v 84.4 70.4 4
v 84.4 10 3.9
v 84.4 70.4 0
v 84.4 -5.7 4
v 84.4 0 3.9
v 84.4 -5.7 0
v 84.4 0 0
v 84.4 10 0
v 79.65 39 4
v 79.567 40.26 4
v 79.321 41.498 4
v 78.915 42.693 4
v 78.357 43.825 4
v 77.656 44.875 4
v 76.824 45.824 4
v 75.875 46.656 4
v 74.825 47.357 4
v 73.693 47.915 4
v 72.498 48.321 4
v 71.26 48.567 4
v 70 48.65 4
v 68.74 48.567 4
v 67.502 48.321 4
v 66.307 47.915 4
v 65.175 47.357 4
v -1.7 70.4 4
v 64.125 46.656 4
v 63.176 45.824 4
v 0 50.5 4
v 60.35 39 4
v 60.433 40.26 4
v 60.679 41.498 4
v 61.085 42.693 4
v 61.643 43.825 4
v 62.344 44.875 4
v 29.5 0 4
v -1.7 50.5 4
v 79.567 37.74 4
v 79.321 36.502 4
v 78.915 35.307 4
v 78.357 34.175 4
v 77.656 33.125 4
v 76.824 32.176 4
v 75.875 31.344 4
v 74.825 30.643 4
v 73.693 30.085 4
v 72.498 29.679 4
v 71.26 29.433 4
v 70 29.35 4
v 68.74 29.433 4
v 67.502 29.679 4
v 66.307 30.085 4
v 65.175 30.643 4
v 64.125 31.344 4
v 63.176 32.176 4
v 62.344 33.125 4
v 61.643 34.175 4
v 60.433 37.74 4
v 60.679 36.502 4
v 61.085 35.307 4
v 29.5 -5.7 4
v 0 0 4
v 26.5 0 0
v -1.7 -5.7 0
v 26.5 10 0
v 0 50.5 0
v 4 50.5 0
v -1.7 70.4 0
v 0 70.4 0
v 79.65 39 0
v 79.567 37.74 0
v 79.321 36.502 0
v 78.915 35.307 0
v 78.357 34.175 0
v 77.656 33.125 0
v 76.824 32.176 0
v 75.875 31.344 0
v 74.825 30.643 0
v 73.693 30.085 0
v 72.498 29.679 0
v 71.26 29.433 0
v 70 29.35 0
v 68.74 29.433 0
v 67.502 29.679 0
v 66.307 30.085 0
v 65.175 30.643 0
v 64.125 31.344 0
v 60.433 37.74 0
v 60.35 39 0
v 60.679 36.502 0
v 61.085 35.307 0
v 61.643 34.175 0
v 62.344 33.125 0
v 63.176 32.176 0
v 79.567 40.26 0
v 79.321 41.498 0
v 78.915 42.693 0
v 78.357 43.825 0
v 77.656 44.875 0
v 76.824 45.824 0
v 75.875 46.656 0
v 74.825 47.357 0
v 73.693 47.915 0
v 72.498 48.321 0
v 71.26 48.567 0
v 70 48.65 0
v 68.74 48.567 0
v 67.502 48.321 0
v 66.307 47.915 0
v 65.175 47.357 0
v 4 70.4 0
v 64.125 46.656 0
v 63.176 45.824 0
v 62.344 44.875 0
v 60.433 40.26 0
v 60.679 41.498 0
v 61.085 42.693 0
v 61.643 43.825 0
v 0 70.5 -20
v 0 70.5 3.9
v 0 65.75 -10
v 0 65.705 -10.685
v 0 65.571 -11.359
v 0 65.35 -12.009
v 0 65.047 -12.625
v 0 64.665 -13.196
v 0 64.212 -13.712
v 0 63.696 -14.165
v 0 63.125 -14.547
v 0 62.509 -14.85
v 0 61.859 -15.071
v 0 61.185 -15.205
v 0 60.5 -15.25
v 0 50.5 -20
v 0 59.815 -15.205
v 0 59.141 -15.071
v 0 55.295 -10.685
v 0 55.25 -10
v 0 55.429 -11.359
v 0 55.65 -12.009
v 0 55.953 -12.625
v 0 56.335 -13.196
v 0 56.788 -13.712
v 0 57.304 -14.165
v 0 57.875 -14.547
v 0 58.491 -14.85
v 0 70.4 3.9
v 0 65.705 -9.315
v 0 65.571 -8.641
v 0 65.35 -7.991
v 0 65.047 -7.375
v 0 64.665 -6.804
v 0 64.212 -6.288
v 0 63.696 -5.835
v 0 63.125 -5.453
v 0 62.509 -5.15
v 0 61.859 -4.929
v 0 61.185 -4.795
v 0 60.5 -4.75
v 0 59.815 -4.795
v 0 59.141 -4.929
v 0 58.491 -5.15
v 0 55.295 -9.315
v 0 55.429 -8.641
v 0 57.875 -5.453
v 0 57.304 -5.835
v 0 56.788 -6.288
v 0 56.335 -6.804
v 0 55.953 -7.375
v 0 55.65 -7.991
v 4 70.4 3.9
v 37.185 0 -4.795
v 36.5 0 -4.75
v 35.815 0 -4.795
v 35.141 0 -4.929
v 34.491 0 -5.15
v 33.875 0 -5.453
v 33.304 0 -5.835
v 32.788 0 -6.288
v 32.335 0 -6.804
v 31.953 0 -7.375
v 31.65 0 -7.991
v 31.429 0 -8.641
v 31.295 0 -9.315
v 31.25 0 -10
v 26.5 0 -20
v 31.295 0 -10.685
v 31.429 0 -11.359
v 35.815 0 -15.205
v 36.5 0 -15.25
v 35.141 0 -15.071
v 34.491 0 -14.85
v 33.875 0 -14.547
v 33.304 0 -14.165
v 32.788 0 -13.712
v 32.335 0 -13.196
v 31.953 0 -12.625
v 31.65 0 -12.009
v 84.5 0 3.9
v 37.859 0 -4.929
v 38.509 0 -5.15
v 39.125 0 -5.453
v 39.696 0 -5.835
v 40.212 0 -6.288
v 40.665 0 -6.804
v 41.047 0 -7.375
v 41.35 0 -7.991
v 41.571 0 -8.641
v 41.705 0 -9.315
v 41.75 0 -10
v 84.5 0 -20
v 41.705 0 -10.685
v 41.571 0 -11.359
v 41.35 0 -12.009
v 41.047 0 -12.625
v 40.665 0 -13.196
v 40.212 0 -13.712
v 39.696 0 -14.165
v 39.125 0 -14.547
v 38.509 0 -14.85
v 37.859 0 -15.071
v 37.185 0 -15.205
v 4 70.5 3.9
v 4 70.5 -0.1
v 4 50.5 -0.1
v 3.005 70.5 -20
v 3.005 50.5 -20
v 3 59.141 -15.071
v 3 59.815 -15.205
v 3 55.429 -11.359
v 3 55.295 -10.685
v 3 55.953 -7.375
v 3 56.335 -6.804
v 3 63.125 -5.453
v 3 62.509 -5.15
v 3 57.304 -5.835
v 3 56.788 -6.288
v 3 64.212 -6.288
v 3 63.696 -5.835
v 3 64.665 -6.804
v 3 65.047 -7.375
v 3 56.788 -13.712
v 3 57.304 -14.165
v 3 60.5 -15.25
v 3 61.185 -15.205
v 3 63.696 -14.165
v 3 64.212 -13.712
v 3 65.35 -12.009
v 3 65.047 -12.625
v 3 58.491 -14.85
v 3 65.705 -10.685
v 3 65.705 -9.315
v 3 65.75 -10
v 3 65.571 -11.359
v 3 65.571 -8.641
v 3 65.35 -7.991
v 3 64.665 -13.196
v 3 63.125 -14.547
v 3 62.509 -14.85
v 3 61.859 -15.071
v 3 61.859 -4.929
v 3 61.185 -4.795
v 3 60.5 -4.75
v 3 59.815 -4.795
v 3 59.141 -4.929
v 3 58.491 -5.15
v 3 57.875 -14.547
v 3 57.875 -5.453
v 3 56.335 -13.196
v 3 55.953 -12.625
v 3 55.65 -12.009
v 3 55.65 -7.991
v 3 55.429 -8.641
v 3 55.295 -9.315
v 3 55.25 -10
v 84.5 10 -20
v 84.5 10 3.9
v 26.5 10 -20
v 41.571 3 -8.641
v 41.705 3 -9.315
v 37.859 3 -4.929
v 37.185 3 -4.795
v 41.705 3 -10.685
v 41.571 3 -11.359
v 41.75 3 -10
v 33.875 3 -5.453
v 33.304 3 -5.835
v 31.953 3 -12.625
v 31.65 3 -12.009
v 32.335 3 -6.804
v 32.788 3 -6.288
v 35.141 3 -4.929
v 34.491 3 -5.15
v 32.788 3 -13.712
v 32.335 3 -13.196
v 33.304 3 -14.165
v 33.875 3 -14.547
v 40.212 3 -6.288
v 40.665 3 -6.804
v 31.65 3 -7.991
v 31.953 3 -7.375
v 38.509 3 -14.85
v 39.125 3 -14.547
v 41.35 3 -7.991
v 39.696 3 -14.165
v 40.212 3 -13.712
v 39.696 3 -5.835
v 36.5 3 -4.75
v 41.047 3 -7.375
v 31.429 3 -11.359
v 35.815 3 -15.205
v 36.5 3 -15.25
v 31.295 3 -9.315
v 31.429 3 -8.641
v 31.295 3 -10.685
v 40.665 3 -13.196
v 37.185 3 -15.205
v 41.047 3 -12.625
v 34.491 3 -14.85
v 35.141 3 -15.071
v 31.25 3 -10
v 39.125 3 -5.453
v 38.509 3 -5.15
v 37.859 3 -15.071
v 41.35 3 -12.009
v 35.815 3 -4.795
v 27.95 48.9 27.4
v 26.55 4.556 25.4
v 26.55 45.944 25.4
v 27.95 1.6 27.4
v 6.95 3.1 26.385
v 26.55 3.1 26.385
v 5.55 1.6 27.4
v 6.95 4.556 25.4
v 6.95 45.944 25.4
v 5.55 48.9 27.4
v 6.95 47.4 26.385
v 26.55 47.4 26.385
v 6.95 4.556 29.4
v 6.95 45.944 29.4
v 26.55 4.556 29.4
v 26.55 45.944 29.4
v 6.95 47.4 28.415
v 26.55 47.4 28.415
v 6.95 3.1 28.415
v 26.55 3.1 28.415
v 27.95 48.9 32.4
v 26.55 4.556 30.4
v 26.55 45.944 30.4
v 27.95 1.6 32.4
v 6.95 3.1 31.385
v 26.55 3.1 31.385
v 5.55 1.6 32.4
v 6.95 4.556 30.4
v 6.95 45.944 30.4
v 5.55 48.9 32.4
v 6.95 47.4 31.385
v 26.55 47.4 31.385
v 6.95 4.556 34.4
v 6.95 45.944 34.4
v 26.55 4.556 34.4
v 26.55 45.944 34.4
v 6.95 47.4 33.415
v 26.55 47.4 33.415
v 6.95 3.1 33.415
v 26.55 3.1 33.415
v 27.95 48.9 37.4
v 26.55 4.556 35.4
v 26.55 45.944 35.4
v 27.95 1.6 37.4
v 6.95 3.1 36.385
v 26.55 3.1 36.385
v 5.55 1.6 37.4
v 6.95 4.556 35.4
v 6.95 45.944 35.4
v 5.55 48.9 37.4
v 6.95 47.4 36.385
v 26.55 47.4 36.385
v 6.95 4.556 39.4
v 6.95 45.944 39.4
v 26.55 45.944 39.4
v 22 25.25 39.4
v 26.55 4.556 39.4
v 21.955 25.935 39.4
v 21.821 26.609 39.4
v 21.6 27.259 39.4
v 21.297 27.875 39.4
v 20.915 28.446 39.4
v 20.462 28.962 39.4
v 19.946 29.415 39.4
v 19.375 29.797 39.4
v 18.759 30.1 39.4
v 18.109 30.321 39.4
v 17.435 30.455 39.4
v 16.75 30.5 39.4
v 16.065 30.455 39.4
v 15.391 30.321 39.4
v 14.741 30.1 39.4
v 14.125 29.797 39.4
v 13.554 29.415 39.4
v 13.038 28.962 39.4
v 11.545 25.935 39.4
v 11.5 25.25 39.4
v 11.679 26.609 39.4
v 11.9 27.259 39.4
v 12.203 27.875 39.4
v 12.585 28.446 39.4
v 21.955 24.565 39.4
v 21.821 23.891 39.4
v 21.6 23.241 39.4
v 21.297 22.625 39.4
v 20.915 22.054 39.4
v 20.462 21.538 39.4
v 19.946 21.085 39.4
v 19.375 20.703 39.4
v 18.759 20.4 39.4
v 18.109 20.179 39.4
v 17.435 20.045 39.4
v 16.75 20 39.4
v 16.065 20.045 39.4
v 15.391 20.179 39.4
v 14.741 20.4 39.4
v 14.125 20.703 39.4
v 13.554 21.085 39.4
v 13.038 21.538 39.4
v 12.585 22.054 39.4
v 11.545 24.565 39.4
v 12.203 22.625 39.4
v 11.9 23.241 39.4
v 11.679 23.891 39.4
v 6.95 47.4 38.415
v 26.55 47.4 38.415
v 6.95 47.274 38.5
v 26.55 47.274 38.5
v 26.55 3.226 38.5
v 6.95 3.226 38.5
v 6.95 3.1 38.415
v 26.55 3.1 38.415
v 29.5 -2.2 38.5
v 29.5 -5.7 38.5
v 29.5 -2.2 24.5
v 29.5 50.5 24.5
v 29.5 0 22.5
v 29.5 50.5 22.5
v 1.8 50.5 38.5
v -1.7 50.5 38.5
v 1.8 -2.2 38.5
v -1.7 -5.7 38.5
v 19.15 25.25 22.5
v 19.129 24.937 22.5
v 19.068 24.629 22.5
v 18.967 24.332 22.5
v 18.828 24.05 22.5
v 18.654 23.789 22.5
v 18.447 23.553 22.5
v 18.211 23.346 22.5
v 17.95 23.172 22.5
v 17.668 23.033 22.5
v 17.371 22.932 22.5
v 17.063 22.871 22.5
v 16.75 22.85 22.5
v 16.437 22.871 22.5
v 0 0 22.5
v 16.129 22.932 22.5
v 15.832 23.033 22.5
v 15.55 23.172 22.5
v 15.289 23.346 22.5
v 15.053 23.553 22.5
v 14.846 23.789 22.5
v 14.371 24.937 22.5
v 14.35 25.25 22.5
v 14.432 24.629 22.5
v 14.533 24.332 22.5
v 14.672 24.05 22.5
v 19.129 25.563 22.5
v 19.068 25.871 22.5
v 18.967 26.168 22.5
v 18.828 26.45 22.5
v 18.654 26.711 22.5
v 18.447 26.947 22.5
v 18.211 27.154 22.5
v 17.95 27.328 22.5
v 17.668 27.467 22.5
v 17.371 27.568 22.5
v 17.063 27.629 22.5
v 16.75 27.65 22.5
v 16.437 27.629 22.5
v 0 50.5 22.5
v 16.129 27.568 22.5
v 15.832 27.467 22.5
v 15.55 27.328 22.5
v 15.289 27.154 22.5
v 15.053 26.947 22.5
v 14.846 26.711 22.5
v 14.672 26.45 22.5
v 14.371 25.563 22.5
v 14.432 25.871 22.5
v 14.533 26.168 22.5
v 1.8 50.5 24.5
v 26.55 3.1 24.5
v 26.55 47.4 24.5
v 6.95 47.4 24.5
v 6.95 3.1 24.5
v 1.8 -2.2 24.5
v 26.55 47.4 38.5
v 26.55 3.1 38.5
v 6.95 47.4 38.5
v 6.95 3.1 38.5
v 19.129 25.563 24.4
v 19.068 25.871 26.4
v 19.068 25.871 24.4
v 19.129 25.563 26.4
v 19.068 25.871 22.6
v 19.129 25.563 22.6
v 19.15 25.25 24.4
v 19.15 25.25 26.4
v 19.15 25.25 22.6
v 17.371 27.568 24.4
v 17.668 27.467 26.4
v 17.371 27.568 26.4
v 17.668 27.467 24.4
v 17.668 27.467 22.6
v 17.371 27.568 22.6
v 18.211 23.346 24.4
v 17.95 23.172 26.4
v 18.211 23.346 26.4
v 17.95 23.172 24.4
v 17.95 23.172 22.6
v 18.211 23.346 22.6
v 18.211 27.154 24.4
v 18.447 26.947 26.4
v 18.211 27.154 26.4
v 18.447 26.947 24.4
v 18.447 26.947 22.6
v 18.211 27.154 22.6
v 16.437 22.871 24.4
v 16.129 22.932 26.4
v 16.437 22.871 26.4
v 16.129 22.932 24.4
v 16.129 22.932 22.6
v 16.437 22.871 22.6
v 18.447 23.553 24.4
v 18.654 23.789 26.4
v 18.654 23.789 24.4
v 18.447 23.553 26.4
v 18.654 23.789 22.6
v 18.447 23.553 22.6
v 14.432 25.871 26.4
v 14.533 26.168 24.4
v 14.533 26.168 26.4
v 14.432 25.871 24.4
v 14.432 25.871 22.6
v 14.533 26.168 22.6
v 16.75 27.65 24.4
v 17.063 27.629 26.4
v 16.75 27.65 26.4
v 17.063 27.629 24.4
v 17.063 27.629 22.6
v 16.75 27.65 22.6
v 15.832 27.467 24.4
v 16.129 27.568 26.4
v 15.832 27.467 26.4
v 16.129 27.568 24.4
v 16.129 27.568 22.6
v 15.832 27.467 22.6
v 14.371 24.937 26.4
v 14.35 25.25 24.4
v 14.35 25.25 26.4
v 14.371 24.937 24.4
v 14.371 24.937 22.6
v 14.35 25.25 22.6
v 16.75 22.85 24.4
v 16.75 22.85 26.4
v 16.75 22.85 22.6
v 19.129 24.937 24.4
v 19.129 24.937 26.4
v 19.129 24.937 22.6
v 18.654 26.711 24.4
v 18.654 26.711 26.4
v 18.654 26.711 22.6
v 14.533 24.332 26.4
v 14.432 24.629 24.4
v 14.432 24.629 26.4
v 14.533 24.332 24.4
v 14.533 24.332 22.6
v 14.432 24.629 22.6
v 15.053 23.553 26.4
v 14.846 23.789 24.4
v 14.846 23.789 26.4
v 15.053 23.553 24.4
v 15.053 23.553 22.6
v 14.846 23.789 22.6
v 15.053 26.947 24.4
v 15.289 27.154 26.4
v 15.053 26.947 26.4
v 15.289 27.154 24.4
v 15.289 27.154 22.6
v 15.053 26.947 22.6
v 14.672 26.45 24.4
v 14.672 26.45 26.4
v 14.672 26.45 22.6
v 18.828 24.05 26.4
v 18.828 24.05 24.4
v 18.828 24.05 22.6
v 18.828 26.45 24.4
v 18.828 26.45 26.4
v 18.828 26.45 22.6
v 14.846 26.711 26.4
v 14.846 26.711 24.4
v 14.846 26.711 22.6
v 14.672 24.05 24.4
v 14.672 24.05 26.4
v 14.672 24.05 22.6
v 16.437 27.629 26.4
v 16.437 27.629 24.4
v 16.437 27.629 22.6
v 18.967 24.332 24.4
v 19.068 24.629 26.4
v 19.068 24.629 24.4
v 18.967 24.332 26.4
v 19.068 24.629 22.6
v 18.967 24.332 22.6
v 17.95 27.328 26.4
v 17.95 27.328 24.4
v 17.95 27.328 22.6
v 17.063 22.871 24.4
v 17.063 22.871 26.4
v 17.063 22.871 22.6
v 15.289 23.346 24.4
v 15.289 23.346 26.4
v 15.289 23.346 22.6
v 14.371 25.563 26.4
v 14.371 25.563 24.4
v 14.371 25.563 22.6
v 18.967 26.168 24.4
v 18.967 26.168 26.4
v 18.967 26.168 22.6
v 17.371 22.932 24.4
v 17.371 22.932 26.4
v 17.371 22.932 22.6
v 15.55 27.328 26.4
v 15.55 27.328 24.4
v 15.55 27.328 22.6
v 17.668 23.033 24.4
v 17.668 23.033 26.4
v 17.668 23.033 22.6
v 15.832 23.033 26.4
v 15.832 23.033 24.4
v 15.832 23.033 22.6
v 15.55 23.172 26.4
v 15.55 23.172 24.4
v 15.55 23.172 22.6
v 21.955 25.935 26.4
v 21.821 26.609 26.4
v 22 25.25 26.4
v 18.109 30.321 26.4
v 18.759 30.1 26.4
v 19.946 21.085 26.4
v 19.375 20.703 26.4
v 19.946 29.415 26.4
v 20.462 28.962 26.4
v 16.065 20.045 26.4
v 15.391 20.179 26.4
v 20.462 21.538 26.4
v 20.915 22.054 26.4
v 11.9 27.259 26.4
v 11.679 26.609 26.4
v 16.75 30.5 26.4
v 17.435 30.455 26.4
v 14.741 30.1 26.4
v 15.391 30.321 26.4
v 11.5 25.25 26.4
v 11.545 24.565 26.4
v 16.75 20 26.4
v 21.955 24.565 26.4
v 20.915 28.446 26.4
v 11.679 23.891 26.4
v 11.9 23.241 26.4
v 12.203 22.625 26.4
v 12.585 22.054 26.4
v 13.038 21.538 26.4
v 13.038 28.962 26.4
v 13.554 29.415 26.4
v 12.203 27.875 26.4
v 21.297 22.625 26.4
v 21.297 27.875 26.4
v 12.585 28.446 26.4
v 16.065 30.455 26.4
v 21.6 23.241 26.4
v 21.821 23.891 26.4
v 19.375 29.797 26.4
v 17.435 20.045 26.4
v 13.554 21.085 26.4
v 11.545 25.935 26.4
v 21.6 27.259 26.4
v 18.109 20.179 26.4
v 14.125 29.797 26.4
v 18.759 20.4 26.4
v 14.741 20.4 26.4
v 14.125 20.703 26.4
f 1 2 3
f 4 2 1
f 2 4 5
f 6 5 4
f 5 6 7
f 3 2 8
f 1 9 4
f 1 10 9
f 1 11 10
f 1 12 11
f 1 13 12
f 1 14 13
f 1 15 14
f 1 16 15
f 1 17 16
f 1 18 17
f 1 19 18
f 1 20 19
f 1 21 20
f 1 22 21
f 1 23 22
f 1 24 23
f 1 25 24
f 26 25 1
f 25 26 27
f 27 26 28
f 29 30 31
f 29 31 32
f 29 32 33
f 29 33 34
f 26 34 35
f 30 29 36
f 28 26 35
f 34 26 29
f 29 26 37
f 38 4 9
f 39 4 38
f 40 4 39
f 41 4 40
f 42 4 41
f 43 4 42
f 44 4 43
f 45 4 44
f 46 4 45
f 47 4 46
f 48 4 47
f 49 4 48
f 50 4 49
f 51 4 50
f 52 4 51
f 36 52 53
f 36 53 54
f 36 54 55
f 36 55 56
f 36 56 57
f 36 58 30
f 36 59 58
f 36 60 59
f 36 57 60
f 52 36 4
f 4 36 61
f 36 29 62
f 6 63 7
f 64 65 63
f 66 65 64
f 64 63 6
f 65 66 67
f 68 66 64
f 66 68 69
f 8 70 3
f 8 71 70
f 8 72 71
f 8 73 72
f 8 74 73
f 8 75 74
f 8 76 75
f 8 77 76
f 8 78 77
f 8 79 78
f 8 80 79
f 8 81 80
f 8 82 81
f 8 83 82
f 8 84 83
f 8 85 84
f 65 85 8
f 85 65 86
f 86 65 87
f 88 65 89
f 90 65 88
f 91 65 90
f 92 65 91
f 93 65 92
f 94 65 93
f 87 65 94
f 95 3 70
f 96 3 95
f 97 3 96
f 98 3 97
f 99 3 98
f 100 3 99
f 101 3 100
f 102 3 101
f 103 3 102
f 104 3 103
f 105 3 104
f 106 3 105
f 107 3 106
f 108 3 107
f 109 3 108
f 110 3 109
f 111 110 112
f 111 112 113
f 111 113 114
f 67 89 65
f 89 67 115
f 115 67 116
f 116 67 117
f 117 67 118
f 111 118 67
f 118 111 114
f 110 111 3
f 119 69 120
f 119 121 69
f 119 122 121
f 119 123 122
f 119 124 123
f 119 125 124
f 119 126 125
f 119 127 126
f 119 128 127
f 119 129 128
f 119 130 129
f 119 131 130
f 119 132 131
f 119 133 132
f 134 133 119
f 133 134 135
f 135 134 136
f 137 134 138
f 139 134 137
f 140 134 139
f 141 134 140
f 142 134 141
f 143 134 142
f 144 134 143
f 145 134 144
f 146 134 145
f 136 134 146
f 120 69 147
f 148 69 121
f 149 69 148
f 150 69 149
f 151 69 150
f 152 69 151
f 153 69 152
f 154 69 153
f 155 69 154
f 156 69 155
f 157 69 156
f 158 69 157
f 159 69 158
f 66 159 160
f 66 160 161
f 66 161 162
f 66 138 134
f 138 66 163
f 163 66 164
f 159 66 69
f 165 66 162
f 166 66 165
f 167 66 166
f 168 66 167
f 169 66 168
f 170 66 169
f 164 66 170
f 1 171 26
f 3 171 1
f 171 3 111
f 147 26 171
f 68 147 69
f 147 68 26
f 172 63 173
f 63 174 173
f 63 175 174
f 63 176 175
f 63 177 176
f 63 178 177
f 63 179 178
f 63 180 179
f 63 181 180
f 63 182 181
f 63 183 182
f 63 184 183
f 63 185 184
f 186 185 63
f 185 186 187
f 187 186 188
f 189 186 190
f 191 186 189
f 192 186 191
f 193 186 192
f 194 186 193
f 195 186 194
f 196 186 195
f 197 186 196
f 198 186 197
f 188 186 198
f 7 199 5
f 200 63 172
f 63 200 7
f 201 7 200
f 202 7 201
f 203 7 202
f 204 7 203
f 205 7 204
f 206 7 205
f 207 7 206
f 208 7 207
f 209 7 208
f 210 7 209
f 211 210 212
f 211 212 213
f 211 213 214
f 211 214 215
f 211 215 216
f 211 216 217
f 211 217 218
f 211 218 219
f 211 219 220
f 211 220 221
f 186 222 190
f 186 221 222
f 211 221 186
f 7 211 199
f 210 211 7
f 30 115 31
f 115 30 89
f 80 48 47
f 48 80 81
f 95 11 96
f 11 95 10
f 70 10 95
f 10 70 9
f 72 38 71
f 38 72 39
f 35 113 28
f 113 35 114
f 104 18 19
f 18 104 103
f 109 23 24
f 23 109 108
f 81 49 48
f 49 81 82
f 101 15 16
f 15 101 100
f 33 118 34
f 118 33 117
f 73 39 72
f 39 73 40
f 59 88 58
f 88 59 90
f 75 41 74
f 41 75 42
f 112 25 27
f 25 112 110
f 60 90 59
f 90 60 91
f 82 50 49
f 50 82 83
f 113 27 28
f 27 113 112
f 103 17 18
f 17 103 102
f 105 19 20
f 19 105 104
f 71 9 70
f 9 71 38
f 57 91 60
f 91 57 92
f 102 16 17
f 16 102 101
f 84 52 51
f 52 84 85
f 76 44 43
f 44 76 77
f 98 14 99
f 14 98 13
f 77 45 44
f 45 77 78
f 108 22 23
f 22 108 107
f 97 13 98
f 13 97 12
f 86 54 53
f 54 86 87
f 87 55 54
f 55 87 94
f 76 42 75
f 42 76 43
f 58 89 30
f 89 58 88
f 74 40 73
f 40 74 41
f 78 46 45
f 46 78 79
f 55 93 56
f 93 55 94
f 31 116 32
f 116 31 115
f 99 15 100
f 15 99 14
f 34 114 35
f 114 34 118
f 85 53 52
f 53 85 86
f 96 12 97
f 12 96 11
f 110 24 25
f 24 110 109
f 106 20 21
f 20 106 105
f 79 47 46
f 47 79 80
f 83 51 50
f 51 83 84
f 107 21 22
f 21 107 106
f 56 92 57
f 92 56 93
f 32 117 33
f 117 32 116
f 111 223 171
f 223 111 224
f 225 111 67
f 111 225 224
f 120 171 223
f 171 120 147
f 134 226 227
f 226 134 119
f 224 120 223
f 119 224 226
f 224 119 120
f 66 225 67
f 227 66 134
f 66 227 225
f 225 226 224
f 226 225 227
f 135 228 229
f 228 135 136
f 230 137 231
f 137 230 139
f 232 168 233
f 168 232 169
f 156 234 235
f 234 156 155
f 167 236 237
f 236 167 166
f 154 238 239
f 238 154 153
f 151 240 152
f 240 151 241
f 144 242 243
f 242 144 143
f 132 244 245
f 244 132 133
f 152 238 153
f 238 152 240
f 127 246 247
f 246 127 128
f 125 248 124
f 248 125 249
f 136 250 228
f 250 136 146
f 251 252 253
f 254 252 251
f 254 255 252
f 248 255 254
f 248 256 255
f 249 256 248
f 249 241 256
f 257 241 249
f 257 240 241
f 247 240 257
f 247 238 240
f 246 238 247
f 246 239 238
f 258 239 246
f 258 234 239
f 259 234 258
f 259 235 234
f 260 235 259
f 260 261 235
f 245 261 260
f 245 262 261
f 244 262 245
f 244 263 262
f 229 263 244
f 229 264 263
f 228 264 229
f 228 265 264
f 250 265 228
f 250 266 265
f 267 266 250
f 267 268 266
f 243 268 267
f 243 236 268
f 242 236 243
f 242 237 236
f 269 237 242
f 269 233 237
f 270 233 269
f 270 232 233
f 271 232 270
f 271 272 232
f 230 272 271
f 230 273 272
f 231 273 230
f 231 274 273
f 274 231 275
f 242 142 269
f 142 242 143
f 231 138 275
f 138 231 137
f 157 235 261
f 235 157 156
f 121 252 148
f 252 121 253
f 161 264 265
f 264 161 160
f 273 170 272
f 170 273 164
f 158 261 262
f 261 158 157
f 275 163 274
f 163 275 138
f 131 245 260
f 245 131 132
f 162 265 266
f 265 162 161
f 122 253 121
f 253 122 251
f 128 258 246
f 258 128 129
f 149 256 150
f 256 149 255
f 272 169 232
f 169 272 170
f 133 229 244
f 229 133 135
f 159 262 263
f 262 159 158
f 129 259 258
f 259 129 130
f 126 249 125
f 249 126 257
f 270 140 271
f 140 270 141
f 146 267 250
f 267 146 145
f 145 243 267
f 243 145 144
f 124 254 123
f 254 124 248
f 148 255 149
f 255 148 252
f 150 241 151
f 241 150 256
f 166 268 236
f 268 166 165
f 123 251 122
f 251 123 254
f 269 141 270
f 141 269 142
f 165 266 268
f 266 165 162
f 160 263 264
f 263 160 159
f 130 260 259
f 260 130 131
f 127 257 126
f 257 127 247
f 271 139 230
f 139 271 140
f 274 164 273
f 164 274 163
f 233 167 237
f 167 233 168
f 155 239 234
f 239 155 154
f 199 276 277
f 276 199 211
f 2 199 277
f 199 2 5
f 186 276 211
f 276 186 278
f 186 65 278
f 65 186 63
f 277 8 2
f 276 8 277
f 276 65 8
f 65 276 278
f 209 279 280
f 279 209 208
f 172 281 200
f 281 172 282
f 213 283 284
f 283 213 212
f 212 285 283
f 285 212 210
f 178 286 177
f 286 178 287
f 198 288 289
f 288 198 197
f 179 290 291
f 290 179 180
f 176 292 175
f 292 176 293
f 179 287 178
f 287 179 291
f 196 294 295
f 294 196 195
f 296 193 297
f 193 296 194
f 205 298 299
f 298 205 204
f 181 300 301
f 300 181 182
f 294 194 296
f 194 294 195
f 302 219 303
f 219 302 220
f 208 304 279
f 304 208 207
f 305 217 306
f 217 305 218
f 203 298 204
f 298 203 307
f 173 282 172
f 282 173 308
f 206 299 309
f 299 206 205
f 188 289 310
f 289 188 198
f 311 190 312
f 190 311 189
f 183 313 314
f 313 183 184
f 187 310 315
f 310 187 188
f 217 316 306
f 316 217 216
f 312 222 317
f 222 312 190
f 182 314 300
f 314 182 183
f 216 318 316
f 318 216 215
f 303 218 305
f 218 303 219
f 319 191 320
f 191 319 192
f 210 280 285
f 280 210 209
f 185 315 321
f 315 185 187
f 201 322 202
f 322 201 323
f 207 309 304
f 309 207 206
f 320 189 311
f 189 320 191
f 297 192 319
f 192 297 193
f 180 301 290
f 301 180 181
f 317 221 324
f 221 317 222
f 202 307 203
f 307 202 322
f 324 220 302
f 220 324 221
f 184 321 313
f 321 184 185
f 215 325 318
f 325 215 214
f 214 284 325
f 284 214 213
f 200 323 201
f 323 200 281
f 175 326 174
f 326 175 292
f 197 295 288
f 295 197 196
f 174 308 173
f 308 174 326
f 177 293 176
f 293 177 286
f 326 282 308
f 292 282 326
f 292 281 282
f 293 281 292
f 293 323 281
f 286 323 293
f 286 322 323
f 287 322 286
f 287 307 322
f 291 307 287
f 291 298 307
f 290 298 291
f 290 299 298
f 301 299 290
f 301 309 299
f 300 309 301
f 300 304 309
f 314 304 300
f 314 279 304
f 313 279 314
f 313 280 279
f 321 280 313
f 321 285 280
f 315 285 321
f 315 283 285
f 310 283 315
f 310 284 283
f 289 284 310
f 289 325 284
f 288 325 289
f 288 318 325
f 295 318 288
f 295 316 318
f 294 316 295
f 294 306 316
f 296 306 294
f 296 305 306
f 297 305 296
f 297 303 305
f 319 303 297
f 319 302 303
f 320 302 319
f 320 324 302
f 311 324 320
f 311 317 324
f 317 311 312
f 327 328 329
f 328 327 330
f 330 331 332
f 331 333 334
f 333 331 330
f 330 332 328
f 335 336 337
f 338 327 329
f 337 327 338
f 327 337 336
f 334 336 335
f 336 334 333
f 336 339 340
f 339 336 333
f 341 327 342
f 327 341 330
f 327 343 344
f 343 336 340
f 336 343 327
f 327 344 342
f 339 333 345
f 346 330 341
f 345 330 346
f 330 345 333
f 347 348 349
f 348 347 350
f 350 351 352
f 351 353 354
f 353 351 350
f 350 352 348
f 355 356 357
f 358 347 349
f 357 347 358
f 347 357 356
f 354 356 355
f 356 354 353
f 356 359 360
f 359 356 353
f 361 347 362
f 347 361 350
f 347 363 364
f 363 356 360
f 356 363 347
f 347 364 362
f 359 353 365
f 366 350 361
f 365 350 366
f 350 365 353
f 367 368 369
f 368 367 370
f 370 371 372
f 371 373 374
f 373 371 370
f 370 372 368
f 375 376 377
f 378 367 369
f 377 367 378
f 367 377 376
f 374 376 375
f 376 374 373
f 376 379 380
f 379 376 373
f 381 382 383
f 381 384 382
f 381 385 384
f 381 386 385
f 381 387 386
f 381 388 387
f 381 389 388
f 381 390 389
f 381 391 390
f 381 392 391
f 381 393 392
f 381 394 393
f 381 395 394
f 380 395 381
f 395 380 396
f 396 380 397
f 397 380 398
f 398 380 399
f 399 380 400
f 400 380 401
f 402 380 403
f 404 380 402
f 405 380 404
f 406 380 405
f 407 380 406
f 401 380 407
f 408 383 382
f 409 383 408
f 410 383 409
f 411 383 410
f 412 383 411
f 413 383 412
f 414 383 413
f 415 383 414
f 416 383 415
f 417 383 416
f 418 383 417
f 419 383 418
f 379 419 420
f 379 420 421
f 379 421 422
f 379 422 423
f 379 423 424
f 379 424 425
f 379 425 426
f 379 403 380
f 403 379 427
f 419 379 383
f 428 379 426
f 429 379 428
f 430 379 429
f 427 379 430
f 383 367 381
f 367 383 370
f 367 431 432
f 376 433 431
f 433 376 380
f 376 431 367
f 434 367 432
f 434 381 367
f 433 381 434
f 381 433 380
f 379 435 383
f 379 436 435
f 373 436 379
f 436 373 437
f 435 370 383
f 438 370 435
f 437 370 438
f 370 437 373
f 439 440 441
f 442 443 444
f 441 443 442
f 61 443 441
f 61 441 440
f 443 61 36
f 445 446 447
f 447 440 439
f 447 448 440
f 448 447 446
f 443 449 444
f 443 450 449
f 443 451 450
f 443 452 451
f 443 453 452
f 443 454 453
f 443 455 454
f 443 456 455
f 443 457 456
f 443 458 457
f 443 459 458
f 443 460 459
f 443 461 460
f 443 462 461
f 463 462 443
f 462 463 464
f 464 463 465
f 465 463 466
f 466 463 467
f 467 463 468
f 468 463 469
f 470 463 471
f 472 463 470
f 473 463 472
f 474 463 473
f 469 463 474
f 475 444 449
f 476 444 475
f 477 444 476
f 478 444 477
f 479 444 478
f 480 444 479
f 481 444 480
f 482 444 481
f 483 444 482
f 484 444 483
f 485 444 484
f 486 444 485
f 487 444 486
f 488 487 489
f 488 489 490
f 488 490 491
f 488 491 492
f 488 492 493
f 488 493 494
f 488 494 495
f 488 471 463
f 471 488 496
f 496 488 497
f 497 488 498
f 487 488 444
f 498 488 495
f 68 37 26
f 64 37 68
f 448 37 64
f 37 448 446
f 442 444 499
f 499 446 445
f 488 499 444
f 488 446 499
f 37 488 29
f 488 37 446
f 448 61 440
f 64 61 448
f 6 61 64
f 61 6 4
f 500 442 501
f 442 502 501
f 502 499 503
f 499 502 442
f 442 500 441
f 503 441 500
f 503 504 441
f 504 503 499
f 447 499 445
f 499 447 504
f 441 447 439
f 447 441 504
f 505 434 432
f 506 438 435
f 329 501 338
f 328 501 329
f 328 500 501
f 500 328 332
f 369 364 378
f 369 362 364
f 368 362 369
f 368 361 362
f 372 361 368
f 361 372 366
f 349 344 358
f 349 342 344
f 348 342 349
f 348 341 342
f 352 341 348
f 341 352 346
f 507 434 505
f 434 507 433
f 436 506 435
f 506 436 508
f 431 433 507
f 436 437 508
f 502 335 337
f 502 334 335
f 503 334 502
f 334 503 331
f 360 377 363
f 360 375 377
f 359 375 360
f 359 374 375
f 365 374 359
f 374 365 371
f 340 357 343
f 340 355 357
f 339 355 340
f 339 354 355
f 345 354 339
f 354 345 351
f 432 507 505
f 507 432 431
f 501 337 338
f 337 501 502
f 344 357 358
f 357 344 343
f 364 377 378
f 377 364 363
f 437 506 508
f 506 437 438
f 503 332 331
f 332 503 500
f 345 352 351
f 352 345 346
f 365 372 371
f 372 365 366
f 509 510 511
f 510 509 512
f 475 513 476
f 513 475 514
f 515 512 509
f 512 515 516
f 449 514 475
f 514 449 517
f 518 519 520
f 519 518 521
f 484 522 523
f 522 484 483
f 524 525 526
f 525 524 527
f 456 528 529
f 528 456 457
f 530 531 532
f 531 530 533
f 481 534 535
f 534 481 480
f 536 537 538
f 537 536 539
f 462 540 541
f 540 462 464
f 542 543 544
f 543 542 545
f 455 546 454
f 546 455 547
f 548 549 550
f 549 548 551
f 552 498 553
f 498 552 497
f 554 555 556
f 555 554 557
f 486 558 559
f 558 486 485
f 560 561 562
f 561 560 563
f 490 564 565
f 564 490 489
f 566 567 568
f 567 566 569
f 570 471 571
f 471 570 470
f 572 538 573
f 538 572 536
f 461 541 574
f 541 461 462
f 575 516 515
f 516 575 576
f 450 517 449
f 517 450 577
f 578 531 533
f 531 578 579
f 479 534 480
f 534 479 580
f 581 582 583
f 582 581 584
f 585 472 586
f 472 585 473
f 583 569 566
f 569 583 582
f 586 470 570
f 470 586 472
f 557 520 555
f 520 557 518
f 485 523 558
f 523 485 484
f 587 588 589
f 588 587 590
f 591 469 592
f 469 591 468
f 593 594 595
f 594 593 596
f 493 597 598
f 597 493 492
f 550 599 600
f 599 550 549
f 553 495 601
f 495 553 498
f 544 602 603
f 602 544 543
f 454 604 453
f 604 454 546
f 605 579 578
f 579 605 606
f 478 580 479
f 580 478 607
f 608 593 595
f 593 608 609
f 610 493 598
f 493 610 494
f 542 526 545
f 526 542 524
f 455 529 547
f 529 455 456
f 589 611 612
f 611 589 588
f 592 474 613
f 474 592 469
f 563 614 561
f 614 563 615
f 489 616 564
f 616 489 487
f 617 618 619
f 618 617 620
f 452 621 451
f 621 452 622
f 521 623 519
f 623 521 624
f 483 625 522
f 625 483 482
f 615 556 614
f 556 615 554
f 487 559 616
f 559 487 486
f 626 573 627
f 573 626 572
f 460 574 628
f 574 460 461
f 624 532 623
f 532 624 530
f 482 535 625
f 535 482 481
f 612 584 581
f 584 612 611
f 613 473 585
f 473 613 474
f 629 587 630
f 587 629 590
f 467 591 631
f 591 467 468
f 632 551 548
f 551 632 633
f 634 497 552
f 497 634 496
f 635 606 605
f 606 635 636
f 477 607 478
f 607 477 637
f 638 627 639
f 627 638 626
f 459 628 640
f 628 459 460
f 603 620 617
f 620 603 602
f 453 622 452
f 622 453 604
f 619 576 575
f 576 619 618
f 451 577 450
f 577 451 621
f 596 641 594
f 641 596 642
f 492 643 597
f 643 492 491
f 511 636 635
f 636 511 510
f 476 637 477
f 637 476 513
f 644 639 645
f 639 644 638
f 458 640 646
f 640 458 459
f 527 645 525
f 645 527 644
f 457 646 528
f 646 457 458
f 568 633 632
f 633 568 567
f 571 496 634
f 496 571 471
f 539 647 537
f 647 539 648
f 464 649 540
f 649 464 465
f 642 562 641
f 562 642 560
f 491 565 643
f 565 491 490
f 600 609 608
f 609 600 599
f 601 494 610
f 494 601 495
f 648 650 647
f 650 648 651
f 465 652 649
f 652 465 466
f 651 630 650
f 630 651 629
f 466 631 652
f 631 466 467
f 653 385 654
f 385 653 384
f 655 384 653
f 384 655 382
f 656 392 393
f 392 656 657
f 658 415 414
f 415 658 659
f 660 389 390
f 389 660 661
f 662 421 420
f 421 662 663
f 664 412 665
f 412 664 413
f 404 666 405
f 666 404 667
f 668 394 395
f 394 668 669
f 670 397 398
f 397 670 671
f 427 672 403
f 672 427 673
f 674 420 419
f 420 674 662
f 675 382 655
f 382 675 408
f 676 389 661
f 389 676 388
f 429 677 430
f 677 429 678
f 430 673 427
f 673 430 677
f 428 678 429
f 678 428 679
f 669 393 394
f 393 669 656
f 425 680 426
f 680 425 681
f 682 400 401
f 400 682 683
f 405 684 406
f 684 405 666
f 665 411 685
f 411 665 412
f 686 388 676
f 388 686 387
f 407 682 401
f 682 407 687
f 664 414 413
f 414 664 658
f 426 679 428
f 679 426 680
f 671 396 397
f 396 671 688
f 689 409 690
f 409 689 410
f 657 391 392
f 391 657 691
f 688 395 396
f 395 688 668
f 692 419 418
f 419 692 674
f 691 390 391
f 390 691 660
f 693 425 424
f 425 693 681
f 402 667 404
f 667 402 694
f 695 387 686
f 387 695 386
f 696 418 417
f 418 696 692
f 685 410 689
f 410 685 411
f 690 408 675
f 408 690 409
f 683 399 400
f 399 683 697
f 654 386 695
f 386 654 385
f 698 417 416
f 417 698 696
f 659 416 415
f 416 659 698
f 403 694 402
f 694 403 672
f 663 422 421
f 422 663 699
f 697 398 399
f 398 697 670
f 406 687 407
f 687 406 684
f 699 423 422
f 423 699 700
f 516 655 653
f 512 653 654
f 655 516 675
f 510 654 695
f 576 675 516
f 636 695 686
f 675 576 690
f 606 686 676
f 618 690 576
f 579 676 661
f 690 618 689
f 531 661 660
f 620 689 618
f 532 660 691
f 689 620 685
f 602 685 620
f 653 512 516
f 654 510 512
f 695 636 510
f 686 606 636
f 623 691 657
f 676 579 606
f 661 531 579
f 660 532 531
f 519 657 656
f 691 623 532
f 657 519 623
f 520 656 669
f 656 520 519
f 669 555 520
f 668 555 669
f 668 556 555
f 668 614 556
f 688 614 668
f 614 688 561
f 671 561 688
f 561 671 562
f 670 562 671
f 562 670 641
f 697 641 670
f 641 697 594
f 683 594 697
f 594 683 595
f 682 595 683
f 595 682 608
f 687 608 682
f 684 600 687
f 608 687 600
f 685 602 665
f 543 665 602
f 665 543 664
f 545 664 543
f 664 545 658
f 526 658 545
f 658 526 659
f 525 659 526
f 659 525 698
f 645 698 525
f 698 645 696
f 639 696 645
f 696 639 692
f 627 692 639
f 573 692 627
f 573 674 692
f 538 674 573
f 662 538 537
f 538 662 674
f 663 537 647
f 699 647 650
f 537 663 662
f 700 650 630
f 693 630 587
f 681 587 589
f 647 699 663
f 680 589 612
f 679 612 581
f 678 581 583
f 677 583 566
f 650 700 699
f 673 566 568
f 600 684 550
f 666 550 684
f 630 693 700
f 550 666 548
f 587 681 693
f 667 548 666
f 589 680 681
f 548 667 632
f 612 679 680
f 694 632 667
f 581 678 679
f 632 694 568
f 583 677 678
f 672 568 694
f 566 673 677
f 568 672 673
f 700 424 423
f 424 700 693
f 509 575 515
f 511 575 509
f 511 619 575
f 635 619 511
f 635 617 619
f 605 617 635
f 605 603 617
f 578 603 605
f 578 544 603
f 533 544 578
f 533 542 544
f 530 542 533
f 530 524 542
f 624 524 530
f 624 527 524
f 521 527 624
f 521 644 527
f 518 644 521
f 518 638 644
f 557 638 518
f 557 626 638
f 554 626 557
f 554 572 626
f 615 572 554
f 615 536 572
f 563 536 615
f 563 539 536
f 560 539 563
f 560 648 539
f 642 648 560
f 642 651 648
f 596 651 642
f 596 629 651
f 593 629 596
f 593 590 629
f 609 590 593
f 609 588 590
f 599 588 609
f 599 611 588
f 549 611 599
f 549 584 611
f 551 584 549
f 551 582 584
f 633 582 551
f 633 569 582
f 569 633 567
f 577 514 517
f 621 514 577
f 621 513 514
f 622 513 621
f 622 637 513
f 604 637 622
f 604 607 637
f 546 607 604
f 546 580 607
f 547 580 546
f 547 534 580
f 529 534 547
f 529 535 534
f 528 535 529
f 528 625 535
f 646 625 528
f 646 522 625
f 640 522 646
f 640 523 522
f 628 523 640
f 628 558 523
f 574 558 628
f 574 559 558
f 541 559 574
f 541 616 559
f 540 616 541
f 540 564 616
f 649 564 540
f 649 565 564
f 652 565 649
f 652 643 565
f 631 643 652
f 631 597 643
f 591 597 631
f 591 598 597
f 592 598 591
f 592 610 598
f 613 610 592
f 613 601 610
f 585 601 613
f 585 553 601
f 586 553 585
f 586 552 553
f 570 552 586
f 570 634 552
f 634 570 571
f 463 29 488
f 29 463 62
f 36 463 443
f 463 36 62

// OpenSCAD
/* 3d printer enclosure from Ikea Melltorp table. Connector pieces. */

/* [Global] */
part = "both"; // [above:Leg coupler (above table top),above-wrap:Leg coupler (wraps around table top),below:Magnet holder (below table top)]

/* [Hidden] */
function inch() = 25.4;
function inner_clear() = 0.5; // how much larger to make holes
$fn = 48;

function middle_thick() = 4; // a bit of clearance from ring_thick()
function magnet_diam() = 10;
function magnet_depth() = 3;
function magnet_margin() = 5;

function ring_inset() = [70,39];
function ring_extra() = [5,22];
function ring_diam() = 17.8 + 1/*clearance*/;
function ring_thick() = 6.1; /* measured */

function leg_inset() = [4,0]; // from 70.2 to 69.4
function table_thick() = 18.5; // 18.2 with a little bit of clearance
function plexi_thick() = 2.2; // including clearance (measured 1.8mm)
function above_thick() = 2; // thickness underneath leg holder
function plexi_guide_thick() = 3.5;


piece(which=part);

module piece(which="both") {
  if (which=="below" || which=="both") {
    below_bracket();
  }
  if (which=="above" || which=="above-wrap" || which=="both") {
    above_bracket();
  }
  if (which=="above-wrap" || which=="both") {
    above_wrapper(shrink=(which=="above-wrap"));
  }
}

module middle(wall=[0,0], extra=[0,0]) {
  inset = ring_inset();
  margin = ring_extra();
  difference() {
    translate([-wall.x,-wall.y,0])
    cube([inset.x + ring_diam()/2 + margin.x + wall.x - extra.x,
          inset.y + ring_diam()/2 + margin.y + wall.y - extra.y,
          middle_thick()]);
    translate([inset.x,inset.y,-1])
      cylinder(d=ring_diam() + inner_clear(), h=middle_thick() + 2);
  }
}

module below_bracket() {
  magnet_y = 14;
  height = magnet_y + magnet_diam()/2 + magnet_margin();
  width = magnet_diam() + 2*magnet_margin();
  extra_width = 38; /* for side holder x axis */
  epsilon=.1;
  middle();
  // front holder
  difference() {
    translate([0,50.5,middle_thick()-height])
      cube([4,width,height-epsilon]);
    translate([3,50.5-epsilon,middle_thick()-height-epsilon])
      rotate([0,atan2(1,height-middle_thick()),0]) // 1mm over height-middle_thick() mm
      cube([2,width+2*epsilon,height+epsilon]);
    translate([-epsilon, 50.5 + width/2, middle_thick() - magnet_y])
      rotate([0,90,0])
      cylinder(d=magnet_diam() + inner_clear(), h=magnet_depth() + epsilon);
  }
  // side holder
  difference() {
    translate([26.5,0,middle_thick()-height])
      cube([width + extra_width,10,height-epsilon]);
    translate([26.5 + width/2, -epsilon, middle_thick() - magnet_y])
      rotate([-90,0,0])
      cylinder(d=magnet_diam() + inner_clear(), h=magnet_depth() + epsilon);
  }
}

module above_wrapper(shrink=false) {
  leg_outer_size = [25.5, 50.5];
  size = leg_inset() + leg_outer_size;
  wall = [-(leg_inset().x - plexi_thick() - plexi_guide_thick()),
          -(leg_inset().y - plexi_thick() - plexi_guide_thick())];
  epsilon = .1;
  difference() {
    translate([-wall.x,-wall.y,0])
      cube([size.x+wall.x,size.y+wall.y,middle_thick() + table_thick() + above_thick() - epsilon]);
    translate([0,0,middle_thick() - epsilon])
      cube([size.x + epsilon, size.y + epsilon, table_thick() + 2*epsilon]);
  }
  middle(wall=wall, extra=shrink?[0,17]:[0,0]);
}

module above_bracket() {
  leg_outer_size = [25.5, 50.5];
  leg_inner_size = [22.4, 47.3];
  leg_core_size = [19.6,44.3];
  leg_holder_height = 14;
  plexi_guide_height = 14;
  screw_hole = 4.3; // measured 3.8
  screw_head_hole = 10; // measured 7.8
  screw_deep = 4;
  epsilon=.1;
  difference() {
  union() translate([0,0,middle_thick() + table_thick()]) {
    *cube([leg_inset().x + leg_outer_size.x,
          leg_inset().y + leg_outer_size.y,
          above_thick()]);
    translate([leg_inset().x + leg_outer_size.x/2,
               leg_inset().y + leg_outer_size.y/2,
               above_thick()-epsilon]) {
      translate([0,0,(leg_holder_height + epsilon)/2])
      cube([leg_core_size.x, leg_core_size.y, leg_holder_height + epsilon],
           center=true);
      // groovy things
      for (i=[0:2]) translate([0,0,5*i + 3])
        for (j=[-1,1]) scale([1,1,j])
          linear_extrude(height=2, scale=leg_core_size.x/leg_inner_size.x)
            square([leg_inner_size.x, leg_inner_size.y], center=true);
      // plexi guide
      difference() {
        translate([-leg_outer_size.x/2 - plexi_thick() - plexi_guide_thick(),
                   -leg_outer_size.y/2 - plexi_thick() - plexi_guide_thick(),
                   -(above_thick()-epsilon)])
          cube([leg_outer_size.x + plexi_thick() + plexi_guide_thick(),
                leg_outer_size.y + plexi_thick() + plexi_guide_thick(),
                plexi_guide_height + above_thick()]);
        translate([-leg_outer_size.x/2 - plexi_thick(),
                   -leg_outer_size.y/2 - plexi_thick(),
                   epsilon])
          cube([leg_outer_size.x + plexi_thick() + epsilon,
                leg_outer_size.y + plexi_thick() + epsilon,
                plexi_guide_height + epsilon]);
      }
    }
  }
  // screw hole
  translate([leg_inset().x + leg_outer_size.x/2,
             leg_inset().y + leg_outer_size.y/2,
             middle_thick() + table_thick() - epsilon]) {
    cylinder(d=screw_hole + inner_clear(),
             h=above_thick() + leg_holder_height + 2*epsilon);
    translate([0,0,screw_deep])
      cylinder(d=screw_head_hole + inner_clear(),
               h=above_thick() + leg_holder_height + 2*epsilon);
  }
  }
}
